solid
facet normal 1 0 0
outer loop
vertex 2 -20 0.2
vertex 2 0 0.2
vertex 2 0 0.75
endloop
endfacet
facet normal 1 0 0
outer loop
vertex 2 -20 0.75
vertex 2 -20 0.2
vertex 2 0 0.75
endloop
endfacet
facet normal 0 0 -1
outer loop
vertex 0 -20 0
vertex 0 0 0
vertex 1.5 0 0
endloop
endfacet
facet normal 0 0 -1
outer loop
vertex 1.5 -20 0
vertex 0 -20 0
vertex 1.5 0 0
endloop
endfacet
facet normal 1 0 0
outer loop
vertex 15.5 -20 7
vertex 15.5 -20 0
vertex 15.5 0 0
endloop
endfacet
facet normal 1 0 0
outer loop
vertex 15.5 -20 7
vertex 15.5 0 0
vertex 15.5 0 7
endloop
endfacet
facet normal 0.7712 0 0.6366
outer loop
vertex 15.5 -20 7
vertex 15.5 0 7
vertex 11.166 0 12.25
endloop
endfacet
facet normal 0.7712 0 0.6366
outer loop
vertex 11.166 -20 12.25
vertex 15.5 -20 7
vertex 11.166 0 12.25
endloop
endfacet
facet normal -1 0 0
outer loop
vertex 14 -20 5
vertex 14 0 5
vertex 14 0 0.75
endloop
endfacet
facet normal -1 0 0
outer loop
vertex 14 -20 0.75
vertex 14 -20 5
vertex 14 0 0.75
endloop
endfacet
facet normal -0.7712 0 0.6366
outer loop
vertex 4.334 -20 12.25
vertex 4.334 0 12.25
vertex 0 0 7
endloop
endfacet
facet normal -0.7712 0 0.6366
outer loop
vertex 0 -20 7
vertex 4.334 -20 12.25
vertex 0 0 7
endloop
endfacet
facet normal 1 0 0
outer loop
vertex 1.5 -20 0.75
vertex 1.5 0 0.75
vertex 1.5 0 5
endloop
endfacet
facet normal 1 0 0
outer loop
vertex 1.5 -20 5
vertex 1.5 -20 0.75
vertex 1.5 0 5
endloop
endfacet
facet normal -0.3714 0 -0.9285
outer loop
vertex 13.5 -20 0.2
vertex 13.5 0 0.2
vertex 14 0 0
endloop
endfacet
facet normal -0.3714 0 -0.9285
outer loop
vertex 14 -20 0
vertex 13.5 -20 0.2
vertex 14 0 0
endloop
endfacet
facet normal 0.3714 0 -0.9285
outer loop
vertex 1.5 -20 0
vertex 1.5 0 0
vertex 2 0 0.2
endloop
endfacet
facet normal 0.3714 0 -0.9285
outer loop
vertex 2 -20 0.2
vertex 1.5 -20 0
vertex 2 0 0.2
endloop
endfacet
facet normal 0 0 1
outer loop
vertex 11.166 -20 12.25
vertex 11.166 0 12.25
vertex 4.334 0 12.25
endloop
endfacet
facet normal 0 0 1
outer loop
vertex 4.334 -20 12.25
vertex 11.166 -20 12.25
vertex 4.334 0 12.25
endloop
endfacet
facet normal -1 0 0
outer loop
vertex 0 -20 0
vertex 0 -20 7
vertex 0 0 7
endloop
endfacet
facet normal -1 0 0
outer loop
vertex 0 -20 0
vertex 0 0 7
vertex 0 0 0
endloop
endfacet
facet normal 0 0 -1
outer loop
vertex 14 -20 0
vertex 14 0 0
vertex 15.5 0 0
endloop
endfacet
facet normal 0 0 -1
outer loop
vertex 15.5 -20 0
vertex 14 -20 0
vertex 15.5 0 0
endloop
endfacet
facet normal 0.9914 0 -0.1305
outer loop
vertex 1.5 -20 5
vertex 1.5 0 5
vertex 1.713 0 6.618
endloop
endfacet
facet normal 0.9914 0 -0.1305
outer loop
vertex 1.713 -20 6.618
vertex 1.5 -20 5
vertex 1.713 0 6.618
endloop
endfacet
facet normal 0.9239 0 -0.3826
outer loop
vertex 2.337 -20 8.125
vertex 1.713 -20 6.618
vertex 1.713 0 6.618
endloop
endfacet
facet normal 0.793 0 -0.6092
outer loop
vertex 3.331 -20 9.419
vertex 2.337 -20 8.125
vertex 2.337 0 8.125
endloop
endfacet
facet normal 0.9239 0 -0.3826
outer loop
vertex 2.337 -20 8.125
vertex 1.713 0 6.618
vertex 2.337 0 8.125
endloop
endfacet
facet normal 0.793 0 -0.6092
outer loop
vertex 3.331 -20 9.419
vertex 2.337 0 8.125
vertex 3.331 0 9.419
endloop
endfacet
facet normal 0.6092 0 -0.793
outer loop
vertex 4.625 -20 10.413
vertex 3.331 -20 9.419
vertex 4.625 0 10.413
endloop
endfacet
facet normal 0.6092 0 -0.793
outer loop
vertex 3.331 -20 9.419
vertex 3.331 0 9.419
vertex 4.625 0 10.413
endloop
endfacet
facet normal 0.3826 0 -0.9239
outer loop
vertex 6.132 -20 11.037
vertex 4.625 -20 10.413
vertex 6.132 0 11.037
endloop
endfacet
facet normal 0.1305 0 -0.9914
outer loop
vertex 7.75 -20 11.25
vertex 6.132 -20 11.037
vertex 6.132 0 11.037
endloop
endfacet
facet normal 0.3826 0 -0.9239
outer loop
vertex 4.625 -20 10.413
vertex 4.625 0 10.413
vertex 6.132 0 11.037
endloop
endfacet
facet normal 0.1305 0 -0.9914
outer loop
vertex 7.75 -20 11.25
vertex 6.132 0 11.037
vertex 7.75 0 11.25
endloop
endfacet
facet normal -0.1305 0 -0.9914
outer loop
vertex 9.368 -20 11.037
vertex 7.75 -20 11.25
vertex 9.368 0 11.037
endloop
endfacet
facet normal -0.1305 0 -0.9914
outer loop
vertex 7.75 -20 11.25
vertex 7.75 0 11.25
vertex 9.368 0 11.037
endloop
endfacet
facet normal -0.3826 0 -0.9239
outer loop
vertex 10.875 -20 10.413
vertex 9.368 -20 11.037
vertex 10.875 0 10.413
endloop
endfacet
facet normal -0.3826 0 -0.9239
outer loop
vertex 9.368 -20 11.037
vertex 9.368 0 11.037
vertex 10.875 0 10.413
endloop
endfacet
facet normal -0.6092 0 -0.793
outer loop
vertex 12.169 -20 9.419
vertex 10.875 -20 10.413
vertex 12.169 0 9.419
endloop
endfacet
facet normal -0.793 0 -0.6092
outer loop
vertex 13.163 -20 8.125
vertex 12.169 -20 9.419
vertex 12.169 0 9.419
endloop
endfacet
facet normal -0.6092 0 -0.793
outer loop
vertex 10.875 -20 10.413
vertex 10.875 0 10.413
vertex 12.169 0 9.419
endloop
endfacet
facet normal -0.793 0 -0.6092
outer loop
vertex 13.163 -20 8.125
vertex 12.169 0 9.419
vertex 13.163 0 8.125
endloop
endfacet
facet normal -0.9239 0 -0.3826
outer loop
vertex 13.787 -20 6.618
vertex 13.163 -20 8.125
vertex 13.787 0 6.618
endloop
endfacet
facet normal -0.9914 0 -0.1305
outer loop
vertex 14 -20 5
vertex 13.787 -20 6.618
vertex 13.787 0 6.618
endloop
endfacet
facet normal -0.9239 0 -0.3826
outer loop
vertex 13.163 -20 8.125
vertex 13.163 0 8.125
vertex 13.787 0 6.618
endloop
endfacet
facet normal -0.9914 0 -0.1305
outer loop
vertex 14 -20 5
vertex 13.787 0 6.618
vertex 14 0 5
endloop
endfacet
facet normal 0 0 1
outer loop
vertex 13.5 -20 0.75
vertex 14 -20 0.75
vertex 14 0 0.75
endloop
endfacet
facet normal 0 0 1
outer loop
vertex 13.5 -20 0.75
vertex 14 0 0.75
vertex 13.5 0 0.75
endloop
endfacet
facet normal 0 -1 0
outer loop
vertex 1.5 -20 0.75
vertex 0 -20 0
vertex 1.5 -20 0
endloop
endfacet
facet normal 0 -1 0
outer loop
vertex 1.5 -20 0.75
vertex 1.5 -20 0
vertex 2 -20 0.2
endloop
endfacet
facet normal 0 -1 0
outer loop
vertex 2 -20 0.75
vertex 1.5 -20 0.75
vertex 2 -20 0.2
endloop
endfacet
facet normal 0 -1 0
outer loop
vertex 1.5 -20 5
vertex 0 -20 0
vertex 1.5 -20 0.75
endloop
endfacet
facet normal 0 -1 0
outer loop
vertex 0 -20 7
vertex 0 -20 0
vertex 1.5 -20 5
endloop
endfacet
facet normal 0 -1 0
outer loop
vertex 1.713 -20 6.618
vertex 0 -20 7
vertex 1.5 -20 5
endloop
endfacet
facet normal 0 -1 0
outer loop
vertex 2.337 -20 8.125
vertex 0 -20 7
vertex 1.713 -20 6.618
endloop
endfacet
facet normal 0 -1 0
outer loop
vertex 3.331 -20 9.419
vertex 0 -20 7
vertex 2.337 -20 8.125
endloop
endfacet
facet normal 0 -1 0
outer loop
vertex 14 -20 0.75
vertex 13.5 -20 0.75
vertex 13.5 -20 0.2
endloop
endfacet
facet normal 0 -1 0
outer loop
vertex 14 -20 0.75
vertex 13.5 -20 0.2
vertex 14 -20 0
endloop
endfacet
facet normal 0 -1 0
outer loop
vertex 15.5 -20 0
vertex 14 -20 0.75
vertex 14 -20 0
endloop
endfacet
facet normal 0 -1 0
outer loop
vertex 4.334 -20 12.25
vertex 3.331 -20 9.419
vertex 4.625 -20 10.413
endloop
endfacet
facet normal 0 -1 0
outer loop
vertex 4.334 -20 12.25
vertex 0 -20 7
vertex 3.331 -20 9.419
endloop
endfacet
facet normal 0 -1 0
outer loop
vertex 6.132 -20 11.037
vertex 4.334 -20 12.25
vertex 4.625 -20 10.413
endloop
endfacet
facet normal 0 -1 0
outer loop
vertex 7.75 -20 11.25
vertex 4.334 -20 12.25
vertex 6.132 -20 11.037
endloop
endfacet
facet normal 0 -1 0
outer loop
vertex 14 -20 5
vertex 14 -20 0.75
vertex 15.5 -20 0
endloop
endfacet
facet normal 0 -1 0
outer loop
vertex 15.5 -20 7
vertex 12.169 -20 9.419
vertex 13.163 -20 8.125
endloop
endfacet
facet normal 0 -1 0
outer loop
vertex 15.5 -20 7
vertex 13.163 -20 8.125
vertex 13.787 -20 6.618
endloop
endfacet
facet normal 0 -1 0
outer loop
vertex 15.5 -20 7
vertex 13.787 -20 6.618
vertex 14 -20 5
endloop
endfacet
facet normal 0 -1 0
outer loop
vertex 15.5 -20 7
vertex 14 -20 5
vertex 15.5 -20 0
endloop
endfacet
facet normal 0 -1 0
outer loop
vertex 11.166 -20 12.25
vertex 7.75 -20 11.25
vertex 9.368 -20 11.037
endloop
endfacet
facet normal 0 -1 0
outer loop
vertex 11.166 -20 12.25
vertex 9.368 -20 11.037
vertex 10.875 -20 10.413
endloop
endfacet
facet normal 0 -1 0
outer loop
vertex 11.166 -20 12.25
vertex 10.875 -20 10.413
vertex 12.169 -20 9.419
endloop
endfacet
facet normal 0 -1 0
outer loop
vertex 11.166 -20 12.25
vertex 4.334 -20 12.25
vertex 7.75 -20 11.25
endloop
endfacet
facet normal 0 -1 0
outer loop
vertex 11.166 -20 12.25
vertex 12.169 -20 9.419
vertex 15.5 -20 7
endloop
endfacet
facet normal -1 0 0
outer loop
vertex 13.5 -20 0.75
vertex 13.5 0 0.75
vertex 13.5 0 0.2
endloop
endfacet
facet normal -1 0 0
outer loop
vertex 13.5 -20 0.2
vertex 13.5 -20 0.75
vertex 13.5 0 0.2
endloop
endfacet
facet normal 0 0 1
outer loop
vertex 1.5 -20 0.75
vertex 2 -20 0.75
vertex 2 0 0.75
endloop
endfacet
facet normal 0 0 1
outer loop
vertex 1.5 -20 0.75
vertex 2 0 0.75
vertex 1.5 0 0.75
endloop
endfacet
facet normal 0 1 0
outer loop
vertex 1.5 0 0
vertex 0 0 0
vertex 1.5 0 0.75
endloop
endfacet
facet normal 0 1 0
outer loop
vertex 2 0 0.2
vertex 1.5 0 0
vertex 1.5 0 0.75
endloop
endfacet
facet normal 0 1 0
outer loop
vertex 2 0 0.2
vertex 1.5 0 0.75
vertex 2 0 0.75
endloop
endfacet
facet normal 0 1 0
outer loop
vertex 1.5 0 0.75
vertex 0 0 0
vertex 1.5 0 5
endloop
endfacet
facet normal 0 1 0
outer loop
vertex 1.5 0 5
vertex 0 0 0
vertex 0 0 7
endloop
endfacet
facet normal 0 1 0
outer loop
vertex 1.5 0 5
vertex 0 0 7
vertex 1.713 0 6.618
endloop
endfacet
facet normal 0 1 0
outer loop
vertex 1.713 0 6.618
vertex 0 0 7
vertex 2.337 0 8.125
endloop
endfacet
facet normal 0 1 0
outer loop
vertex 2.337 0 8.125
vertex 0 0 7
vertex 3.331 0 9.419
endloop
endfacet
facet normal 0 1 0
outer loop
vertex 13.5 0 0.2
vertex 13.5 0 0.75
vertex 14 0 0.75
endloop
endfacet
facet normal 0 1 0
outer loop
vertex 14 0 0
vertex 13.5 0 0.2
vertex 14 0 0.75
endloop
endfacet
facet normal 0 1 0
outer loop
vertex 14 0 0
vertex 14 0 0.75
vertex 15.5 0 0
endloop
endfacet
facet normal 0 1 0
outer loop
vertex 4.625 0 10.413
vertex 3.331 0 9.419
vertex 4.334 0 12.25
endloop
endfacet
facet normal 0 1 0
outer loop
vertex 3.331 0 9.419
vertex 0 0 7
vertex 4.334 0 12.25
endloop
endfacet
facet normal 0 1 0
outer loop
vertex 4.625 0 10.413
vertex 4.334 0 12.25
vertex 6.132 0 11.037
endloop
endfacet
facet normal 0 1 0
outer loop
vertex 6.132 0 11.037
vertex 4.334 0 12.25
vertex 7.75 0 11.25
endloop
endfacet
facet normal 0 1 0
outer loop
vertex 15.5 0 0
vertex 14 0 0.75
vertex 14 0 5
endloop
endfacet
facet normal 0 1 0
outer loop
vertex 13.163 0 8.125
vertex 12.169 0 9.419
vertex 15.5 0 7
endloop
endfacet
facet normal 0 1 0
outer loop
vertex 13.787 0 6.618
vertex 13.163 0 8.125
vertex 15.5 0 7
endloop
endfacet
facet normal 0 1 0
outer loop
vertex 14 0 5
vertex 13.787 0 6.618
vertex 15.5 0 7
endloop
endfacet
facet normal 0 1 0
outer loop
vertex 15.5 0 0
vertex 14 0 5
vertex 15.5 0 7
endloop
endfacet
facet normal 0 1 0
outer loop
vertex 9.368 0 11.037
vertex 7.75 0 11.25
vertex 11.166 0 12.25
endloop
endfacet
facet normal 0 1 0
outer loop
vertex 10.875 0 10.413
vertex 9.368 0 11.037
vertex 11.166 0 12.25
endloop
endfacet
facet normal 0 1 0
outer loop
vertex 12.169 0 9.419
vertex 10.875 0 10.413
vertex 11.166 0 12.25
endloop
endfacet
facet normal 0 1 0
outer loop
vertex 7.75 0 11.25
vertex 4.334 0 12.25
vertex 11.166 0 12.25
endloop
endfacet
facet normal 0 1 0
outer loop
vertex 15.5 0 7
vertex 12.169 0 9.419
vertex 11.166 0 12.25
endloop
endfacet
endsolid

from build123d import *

# Parameters (mm, degrees)
F1_DEPTH = 20


with BuildPart() as f1:
    # F0 (on Front) → F1 (new body)
    with BuildSketch(Plane.XZ):
        with BuildLine():
            Line((0, 7), (0, 0))
            Line((0, 0), (1.5, 0))
            Line((1.5, 0), (2, 0.2))
            Line((2, 0.2), (2, 0.75))
            Line((2, 0.75), (1.5, 0.75))
            Line((1.5, 0.75), (1.5, 5))
            ThreePointArc((1.5, 5), (7.75, 11.25), (14, 5))
            Line((14, 5), (14, 0.75))
            Line((14, 0.75), (13.5, 0.75))
            Line((13.5, 0.75), (13.5, 0.2))
            Line((13.5, 0.2), (14, 0))
            Line((14, 0), (15.5, 0))
            Line((15.5, 0), (15.5, 7))
            Line((15.5, 7), (11.166384, 12.25))
            Line((11.166384, 12.25), (7.75, 12.25))
            Line((7.75, 12.25), (4.333616, 12.25))
            Line((4.333616, 12.25), (0, 7))
        make_face()
    extrude(amount=F1_DEPTH)


solid = f1.part
